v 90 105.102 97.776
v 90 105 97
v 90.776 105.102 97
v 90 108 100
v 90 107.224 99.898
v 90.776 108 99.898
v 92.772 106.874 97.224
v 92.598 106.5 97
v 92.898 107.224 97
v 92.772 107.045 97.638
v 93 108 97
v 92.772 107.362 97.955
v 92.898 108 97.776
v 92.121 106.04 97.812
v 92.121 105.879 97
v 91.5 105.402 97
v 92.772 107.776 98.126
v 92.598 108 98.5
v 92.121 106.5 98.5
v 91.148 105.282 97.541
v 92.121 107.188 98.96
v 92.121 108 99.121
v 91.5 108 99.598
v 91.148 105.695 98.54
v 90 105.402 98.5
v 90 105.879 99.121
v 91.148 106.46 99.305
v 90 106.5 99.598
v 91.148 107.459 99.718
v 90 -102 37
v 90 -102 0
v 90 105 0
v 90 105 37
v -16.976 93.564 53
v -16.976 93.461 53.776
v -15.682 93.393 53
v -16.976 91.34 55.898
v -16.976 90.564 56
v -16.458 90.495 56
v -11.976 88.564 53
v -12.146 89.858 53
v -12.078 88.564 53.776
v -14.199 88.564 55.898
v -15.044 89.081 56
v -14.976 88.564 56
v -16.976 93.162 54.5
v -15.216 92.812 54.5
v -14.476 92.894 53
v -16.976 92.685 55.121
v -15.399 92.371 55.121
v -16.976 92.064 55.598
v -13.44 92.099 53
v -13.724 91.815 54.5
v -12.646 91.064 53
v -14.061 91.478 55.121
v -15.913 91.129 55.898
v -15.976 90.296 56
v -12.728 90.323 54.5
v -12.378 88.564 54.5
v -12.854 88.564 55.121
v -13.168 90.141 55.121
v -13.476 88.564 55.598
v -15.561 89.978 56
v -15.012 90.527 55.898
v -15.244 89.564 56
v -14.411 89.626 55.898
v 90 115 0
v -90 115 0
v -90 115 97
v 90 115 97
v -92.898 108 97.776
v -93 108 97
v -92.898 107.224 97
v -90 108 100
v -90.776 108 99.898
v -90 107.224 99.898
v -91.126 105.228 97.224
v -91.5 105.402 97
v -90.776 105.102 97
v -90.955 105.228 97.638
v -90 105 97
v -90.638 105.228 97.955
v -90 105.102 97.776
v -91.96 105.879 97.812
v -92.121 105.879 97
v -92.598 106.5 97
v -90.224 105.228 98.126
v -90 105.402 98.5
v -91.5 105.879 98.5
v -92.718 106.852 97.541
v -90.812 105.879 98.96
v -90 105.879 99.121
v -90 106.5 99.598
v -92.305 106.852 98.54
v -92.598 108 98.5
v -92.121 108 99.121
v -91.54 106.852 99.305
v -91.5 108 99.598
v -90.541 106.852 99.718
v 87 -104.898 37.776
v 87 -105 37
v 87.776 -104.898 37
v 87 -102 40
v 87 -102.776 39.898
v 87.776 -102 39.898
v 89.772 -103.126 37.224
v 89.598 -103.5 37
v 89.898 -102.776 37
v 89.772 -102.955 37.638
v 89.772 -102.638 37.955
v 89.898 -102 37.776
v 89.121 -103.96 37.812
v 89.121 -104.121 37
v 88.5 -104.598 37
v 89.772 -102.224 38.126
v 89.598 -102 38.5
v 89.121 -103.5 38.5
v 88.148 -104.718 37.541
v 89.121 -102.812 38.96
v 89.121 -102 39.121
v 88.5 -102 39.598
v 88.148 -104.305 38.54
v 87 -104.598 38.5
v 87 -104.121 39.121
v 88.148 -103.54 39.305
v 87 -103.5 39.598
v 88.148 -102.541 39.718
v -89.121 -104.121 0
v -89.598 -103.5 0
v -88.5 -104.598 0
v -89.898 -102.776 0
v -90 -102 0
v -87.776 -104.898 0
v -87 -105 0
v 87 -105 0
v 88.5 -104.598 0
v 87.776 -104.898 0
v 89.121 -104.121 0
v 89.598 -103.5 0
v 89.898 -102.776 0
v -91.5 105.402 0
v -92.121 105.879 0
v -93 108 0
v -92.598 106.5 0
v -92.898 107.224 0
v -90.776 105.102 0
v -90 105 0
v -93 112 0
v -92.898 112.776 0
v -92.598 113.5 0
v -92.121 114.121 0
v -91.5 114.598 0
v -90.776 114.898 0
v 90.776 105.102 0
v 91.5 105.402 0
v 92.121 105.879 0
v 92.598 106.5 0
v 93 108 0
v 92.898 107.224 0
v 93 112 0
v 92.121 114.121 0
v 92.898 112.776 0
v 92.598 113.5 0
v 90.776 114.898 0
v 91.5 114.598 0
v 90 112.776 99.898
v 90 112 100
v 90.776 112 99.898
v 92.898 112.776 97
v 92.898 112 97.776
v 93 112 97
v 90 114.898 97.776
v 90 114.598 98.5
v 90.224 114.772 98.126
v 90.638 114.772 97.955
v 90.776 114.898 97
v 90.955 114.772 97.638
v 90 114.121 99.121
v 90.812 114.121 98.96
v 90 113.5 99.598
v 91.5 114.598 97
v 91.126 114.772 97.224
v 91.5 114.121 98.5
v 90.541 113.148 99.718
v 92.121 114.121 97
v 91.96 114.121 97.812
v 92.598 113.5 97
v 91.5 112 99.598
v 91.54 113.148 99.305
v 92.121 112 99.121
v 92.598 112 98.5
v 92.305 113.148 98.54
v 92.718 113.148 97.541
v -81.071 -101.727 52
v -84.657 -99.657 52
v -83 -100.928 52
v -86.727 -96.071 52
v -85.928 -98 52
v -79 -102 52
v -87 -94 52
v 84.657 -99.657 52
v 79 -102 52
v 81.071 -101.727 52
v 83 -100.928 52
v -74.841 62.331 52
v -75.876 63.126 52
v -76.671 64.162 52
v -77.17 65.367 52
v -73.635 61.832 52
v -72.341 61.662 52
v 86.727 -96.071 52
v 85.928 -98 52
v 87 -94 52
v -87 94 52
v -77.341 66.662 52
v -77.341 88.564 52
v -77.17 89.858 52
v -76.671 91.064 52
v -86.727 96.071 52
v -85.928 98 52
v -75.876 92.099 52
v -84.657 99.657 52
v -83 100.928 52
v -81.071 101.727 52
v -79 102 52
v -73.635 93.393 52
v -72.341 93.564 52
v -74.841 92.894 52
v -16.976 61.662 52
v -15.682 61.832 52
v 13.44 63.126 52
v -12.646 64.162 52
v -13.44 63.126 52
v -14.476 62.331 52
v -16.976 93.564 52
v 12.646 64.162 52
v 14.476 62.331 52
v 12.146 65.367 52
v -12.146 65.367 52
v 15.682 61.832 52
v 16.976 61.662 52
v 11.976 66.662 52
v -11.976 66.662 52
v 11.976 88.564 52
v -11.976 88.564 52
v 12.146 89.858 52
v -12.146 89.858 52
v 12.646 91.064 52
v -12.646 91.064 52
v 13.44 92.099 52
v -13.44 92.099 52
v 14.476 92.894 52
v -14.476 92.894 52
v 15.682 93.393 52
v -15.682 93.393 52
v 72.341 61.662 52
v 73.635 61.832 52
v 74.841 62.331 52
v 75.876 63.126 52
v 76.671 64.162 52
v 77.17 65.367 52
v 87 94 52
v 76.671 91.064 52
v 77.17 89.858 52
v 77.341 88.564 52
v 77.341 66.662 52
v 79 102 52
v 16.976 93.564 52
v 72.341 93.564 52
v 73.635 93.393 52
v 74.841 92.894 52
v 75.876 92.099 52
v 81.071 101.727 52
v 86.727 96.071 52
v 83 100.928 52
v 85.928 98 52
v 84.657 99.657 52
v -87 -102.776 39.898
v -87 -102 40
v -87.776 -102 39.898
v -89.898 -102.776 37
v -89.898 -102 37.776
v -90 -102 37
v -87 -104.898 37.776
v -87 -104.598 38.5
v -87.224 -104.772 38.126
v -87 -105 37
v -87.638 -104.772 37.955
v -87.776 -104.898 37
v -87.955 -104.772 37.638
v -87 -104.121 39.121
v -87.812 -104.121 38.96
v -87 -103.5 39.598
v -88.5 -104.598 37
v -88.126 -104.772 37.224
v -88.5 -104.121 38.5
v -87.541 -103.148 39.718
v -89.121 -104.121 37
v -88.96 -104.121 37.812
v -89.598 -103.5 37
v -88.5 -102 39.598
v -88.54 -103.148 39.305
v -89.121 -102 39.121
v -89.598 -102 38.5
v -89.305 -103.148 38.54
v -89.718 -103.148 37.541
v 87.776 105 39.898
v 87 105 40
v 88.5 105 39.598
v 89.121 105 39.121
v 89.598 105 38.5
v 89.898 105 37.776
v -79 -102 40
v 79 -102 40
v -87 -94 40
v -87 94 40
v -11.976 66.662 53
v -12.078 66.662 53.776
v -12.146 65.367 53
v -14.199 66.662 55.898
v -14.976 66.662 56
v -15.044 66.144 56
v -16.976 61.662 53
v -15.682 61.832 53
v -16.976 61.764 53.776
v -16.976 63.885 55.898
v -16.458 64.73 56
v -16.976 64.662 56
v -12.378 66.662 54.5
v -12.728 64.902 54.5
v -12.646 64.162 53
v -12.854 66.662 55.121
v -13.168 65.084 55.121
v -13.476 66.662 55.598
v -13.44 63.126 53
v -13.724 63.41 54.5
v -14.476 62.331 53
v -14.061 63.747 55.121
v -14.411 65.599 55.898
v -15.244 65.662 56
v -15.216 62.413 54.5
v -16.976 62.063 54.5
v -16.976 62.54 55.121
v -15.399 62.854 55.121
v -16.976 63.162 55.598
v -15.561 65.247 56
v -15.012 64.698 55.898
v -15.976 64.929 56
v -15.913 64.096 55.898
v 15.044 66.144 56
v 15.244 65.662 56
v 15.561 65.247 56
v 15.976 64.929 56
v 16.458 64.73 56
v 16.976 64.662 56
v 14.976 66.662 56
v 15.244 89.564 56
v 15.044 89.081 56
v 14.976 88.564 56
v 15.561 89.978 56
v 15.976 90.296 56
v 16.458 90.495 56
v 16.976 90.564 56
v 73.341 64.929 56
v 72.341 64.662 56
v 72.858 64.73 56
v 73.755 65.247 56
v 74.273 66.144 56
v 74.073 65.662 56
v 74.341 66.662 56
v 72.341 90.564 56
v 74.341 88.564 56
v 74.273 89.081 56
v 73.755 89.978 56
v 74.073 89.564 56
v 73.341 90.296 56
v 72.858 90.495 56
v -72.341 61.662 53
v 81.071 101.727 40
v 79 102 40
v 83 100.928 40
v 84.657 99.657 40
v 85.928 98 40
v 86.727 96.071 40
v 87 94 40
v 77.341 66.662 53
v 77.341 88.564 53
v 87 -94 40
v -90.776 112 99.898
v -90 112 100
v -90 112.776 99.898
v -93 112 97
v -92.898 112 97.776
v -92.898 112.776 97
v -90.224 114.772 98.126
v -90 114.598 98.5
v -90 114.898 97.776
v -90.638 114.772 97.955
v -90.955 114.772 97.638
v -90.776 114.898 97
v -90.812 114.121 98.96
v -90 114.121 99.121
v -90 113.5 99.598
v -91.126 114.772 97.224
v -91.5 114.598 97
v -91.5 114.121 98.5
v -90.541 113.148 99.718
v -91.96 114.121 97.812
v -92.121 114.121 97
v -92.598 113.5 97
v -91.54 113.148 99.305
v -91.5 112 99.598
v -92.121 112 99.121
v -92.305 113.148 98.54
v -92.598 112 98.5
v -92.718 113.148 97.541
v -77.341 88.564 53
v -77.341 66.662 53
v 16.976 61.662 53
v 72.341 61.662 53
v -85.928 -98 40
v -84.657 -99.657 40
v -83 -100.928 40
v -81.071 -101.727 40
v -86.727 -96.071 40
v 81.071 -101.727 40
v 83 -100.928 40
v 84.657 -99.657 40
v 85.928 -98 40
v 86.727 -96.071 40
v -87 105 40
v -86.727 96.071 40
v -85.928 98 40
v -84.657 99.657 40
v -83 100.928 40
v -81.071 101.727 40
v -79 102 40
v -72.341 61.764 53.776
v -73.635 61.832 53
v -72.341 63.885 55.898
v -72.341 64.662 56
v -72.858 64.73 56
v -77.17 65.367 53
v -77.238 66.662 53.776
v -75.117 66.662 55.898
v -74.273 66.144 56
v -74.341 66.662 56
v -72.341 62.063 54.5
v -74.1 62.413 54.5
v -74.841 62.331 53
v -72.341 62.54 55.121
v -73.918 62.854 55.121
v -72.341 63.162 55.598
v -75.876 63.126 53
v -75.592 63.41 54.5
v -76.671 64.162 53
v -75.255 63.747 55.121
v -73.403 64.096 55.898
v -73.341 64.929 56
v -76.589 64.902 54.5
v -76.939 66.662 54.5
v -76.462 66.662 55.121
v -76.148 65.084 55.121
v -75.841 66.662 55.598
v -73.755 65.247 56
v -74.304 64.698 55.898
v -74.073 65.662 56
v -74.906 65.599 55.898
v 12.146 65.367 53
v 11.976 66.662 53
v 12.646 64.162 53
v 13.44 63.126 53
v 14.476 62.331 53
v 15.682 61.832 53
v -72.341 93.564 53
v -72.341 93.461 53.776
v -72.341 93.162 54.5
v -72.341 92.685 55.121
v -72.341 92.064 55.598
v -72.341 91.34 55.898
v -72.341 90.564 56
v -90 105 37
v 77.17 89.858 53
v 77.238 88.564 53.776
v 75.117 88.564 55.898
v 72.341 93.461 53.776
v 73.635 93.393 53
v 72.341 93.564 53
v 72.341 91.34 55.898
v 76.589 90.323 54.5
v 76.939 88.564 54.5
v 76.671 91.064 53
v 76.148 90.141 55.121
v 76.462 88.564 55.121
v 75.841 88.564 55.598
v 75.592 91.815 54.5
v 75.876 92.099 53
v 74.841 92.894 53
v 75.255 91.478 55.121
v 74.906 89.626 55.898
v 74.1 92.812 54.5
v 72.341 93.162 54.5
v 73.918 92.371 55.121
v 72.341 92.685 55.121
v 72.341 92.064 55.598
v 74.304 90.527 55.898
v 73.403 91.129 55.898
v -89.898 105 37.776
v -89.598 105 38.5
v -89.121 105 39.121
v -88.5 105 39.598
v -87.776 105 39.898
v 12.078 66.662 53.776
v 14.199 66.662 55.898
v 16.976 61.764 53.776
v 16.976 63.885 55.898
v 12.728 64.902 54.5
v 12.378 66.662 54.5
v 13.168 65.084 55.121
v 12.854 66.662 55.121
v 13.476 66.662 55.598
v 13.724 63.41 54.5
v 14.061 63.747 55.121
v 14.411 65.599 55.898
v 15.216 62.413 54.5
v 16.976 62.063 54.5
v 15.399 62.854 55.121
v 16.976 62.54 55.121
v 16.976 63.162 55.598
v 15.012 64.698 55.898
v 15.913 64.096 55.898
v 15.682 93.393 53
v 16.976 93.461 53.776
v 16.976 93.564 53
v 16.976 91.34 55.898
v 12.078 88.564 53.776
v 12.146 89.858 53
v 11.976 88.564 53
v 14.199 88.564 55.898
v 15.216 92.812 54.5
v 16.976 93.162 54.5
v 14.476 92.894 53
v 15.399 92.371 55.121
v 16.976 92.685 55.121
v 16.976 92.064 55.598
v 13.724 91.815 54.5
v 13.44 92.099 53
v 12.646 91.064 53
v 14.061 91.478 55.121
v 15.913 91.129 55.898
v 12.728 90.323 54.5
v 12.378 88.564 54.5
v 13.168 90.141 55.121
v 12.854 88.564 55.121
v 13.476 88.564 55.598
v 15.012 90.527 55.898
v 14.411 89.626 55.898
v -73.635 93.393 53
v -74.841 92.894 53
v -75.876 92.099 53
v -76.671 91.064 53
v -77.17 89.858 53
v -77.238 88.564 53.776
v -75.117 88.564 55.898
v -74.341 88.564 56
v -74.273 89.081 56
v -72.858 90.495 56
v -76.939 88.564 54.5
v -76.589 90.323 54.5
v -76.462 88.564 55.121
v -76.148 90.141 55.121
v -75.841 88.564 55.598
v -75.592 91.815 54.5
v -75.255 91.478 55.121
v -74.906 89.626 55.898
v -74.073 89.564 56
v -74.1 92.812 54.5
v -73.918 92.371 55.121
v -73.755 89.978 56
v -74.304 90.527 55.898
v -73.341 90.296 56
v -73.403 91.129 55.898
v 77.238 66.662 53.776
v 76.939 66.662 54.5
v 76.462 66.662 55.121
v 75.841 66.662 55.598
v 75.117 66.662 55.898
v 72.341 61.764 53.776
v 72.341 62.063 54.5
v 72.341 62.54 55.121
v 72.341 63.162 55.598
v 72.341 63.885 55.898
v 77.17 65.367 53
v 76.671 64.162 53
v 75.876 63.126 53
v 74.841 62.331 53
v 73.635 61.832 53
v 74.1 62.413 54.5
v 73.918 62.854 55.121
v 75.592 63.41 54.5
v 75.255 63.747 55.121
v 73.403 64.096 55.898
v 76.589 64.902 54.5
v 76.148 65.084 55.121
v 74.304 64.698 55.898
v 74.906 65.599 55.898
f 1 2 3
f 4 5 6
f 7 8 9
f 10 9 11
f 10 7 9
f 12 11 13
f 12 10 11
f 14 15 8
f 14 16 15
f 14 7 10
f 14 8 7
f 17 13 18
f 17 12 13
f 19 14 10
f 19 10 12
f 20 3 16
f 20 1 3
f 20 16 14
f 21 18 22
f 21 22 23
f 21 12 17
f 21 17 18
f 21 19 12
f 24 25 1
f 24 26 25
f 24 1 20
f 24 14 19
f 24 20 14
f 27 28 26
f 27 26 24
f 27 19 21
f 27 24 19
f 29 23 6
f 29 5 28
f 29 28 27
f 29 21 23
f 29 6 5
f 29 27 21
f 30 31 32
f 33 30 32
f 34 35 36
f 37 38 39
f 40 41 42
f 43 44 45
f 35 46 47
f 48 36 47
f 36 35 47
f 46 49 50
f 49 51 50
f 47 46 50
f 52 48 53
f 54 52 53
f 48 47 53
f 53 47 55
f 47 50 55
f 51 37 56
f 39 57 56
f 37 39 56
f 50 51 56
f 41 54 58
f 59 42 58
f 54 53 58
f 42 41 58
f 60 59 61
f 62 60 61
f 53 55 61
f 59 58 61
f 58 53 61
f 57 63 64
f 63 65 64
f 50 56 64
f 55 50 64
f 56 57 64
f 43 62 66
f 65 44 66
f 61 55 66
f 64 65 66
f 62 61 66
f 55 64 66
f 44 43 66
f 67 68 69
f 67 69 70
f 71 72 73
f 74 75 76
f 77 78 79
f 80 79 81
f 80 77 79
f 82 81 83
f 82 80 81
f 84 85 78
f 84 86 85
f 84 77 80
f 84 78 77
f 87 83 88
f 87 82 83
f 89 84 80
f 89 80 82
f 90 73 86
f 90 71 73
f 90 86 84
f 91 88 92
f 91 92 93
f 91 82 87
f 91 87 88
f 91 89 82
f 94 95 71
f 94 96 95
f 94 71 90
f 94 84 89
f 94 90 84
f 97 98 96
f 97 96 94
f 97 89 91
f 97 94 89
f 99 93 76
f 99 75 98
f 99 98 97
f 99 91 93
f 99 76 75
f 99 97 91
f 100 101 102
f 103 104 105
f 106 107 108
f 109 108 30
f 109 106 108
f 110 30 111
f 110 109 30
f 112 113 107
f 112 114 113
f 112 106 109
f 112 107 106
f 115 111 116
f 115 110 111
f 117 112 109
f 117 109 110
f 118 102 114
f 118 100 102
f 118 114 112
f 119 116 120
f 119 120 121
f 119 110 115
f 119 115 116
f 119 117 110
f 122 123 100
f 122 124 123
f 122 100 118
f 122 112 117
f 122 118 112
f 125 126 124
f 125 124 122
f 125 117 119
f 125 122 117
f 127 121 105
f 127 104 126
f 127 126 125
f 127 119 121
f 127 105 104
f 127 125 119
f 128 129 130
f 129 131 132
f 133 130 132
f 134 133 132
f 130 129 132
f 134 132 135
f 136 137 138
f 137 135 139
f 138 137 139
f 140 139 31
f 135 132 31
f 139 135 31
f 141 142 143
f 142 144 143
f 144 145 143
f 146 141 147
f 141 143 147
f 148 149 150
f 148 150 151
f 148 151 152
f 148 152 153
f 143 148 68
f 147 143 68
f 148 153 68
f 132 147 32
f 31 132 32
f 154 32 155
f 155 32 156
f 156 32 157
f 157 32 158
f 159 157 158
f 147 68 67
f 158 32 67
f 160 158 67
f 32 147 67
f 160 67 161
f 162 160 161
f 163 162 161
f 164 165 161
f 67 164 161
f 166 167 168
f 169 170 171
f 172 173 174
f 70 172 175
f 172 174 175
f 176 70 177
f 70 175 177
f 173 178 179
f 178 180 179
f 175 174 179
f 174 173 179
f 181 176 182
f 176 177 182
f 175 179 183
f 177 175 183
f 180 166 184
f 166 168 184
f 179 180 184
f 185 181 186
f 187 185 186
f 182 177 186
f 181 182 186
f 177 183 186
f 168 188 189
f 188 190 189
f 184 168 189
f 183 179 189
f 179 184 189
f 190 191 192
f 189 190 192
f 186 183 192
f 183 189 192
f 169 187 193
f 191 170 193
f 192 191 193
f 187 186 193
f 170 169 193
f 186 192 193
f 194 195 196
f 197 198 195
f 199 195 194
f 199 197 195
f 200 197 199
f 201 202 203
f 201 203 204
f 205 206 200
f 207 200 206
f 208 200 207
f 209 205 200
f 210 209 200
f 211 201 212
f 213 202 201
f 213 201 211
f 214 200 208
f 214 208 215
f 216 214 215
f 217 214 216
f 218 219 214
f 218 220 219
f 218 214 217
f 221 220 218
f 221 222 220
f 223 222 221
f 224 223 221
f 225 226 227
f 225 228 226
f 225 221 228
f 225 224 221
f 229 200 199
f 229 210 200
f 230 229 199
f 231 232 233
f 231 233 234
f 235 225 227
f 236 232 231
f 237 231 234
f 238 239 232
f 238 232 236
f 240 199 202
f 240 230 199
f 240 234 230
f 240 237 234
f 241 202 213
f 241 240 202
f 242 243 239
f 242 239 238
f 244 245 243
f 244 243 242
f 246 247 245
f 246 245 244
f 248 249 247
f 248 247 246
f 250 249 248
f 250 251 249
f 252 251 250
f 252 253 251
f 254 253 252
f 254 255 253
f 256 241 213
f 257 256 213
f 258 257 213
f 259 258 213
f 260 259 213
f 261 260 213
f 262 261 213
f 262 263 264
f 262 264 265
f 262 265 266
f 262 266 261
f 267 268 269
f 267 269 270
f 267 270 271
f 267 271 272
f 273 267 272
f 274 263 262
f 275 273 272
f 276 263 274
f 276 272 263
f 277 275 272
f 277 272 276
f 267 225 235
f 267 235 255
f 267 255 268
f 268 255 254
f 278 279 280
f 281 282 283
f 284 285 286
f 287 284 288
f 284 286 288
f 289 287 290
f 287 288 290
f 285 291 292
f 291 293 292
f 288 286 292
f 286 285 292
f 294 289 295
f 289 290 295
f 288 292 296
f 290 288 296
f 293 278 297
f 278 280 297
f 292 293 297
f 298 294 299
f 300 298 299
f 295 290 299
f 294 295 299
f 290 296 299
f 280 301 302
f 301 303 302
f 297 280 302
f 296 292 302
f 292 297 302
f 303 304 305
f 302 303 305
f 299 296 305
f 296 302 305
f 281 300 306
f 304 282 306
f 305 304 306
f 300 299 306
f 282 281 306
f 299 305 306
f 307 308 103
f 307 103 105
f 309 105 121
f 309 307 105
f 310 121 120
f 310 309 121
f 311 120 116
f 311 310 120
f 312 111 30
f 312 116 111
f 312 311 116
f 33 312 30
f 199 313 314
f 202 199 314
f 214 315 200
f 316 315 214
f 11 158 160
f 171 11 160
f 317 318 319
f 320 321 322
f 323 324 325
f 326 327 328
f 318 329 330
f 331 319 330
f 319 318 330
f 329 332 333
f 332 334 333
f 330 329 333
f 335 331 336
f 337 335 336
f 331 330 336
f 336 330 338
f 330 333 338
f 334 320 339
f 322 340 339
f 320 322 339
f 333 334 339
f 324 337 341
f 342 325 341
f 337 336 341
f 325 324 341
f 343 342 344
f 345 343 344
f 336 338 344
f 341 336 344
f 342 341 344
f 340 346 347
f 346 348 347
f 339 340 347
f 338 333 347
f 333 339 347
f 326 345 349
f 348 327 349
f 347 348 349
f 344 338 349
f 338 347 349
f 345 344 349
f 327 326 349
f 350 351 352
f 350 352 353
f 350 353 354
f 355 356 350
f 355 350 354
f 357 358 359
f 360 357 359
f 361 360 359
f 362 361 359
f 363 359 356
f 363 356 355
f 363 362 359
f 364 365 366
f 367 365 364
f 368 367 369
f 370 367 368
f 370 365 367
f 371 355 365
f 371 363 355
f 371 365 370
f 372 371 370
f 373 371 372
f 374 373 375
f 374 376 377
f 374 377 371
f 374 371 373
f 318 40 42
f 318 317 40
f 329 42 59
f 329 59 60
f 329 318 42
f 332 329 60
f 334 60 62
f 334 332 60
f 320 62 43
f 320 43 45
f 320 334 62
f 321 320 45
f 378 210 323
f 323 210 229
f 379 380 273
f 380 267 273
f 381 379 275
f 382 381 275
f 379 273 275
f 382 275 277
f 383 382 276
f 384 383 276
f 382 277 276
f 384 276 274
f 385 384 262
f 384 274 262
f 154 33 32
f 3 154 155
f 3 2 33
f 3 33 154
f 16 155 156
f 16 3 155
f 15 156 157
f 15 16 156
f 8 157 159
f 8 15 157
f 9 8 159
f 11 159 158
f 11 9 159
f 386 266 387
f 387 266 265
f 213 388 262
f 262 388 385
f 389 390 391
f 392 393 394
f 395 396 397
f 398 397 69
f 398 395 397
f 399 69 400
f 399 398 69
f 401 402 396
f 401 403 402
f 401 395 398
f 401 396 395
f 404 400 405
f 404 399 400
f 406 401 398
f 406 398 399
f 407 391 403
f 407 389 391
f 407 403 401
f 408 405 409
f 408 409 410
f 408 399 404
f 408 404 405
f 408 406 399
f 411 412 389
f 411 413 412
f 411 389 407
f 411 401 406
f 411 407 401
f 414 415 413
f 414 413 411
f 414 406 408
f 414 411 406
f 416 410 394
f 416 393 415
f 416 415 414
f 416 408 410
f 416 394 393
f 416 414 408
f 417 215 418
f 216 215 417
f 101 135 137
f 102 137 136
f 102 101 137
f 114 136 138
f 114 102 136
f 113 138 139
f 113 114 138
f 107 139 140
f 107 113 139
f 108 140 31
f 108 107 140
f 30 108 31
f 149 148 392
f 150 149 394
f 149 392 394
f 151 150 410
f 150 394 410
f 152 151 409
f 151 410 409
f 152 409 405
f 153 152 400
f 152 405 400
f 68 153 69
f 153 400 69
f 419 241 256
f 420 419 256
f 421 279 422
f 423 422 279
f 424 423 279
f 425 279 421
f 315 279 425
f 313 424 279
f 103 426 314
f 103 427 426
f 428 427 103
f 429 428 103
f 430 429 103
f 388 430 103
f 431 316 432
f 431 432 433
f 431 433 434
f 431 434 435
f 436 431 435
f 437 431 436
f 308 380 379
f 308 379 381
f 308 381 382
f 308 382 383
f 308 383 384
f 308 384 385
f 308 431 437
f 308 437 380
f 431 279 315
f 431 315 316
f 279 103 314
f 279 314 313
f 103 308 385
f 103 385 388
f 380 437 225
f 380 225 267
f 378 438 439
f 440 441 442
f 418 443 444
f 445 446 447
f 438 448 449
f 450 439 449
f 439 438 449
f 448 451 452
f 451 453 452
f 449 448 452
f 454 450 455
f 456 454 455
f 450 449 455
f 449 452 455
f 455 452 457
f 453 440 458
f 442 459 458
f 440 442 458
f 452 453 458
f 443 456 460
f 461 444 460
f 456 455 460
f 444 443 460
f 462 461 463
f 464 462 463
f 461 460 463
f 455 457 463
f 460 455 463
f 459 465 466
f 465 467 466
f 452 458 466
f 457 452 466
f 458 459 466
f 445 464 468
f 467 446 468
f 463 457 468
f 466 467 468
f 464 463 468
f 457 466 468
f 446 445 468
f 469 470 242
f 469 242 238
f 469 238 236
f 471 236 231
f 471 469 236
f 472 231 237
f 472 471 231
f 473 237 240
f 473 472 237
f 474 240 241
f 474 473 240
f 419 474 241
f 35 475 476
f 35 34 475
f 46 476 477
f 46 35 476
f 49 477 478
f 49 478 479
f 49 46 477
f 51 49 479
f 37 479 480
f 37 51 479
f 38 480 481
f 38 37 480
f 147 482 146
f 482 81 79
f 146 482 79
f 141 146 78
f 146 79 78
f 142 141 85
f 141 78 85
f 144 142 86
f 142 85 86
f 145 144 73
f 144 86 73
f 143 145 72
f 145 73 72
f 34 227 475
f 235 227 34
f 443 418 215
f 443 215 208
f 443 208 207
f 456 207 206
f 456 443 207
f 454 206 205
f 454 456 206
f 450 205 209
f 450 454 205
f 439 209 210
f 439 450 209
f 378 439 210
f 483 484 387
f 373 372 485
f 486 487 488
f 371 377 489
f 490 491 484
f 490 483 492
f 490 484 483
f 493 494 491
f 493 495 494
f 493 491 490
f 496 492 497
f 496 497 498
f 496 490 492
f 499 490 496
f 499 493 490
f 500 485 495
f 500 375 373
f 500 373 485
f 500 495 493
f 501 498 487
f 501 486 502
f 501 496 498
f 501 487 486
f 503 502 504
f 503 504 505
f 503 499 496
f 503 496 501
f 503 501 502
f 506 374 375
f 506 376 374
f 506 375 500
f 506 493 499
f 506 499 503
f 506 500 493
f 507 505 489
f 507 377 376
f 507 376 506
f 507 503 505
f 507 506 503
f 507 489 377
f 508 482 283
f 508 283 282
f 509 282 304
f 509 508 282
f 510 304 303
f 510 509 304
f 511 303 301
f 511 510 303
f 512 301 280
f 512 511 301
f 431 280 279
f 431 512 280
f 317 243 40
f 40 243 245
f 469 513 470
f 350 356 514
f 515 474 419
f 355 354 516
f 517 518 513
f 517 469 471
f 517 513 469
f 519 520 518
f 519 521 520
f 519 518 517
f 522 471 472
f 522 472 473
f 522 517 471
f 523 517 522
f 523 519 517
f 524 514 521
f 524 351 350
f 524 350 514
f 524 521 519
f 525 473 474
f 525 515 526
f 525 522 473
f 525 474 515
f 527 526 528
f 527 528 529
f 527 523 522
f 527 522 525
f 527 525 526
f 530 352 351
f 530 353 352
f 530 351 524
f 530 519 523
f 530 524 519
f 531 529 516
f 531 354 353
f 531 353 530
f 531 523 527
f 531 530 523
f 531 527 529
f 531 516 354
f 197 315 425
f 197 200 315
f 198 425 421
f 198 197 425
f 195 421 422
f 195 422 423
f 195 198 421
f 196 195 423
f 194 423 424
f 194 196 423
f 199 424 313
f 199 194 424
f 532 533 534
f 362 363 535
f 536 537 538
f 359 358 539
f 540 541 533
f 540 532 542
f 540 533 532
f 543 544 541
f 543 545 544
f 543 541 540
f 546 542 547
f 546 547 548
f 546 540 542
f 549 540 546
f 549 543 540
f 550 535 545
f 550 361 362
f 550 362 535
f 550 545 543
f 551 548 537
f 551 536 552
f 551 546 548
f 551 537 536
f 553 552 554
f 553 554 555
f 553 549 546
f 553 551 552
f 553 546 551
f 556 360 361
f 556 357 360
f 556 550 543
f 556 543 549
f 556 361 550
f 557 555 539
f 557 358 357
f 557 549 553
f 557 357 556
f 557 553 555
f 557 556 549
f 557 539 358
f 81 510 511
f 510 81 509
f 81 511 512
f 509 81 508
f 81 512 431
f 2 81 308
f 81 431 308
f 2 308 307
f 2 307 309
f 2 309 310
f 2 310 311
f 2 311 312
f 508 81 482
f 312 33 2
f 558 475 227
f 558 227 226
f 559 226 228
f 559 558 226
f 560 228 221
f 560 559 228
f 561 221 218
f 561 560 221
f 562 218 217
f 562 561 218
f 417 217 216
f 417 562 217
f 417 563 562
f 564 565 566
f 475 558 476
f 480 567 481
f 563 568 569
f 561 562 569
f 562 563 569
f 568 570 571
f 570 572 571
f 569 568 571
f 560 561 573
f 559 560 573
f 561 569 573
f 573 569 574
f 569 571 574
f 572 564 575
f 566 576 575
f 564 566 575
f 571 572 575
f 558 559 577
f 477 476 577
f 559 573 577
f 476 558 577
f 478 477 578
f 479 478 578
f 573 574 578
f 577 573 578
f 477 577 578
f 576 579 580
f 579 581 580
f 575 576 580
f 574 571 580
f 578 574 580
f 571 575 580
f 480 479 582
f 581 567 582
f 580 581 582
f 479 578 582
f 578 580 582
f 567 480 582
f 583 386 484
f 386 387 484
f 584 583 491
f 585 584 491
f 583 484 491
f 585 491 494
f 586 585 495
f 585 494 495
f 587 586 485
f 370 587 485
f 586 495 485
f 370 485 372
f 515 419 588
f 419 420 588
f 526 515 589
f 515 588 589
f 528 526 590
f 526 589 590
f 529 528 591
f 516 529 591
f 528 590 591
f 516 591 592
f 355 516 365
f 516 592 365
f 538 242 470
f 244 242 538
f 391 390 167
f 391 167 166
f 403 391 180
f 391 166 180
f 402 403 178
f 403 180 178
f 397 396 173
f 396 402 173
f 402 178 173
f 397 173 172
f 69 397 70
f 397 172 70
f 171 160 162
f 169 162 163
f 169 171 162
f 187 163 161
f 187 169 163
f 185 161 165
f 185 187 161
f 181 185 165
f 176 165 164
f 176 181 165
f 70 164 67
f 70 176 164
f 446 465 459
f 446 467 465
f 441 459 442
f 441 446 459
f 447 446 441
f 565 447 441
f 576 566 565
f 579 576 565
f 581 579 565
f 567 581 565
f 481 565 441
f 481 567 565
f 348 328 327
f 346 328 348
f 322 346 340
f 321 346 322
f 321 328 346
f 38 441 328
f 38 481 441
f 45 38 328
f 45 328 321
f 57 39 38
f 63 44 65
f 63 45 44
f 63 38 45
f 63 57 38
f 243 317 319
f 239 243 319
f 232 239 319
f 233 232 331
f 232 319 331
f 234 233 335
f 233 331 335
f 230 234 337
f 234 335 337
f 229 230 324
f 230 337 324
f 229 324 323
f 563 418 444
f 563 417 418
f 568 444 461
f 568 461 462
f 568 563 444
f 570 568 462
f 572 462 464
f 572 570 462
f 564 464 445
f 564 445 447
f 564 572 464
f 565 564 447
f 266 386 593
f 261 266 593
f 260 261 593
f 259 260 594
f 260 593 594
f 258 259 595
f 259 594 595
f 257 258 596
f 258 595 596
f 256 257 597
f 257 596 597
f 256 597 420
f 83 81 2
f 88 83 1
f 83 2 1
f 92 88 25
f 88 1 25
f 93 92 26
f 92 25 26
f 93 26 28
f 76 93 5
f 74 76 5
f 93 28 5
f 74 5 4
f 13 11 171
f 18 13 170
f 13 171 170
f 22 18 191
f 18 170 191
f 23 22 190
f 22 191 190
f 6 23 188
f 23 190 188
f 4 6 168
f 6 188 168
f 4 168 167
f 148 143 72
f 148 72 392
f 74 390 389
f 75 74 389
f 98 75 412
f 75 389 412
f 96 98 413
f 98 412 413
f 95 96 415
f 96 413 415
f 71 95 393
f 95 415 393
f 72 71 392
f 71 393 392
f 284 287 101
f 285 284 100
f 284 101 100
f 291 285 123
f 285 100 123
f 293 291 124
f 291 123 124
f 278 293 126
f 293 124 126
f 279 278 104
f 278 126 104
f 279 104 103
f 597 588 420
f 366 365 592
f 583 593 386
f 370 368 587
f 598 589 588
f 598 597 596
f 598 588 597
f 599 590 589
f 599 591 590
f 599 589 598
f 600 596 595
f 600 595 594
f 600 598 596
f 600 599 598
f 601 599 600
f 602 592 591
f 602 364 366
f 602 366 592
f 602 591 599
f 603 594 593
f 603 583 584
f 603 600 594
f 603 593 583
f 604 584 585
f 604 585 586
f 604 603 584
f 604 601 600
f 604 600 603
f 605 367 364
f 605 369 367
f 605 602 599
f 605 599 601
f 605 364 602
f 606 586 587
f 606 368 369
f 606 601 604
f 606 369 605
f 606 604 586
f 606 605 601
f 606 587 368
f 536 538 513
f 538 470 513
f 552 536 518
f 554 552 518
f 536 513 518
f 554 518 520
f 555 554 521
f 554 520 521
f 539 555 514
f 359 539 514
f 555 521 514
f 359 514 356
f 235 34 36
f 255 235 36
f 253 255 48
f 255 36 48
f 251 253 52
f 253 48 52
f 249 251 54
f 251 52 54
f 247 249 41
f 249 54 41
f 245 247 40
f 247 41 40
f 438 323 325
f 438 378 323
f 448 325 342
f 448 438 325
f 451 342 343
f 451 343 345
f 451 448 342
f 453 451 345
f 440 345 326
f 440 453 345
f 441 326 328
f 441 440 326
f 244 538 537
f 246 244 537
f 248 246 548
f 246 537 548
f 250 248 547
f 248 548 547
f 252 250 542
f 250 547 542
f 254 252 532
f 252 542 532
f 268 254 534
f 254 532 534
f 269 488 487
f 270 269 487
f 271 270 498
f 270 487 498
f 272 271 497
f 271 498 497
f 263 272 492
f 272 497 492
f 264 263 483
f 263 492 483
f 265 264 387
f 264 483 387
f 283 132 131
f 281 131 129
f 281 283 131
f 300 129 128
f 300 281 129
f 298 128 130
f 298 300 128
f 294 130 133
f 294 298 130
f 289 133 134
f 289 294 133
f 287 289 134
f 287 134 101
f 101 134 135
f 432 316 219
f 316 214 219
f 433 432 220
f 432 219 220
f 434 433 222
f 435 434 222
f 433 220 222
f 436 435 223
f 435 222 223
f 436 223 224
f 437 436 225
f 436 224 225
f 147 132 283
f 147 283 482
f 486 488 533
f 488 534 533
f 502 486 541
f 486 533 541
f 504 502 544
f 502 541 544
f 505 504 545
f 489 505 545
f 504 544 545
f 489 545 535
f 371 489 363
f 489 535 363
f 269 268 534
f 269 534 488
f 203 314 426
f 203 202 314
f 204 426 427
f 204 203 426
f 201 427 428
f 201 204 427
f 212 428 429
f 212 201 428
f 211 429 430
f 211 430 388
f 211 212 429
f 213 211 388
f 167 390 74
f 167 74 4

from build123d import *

# Parameters (mm, degrees)
F0_W     = 180
F0_H     = 210
F1_DEPTH = 40
F2_W     = 186
F2_H     = 10
F3_DEPTH = 100
F4_W     = 174
F4_H     = 204
F5_DEPTH = 12
F6_W     = 65.3649838641
F6_H     = 31.9020412862
F7_DEPTH = 4
F8_DEPTH = 4
F9_R     = 8
F10_R    = 3
F11_R    = 2.99999
F12_R    = 5
F13_R    = 3


# Not quite as in the source:
# - a fillet or chamfer is up to 0.001 mm smaller than in the source, because OpenCascade refuses the exact size


with BuildPart() as f1:
    # F0 (on Top) → F1 (new body)
    with BuildSketch(Plane.XY):
        Rectangle(F0_W, F0_H)
    extrude(amount=F1_DEPTH)

    # F2 (on Top) → F3 (join)
    with BuildSketch(Plane.XY):
        with Locations((0, 110)):
            Rectangle(F2_W, F2_H)
    extrude(amount=F3_DEPTH)

    # F4 (on face) → F5 (join)
    with BuildSketch(Plane.XY.offset(40)):
        Rectangle(F4_W, F4_H)
    extrude(amount=F5_DEPTH)

    # F6 (on face) → F7 (join)
    with BuildSketch(Plane.XY.offset(52)):
        with Locations((-44.6581854485, 77.6125434786)):
            Rectangle(F6_W, F6_H)
    extrude(amount=F7_DEPTH)

    # F6 (on face) → F8 (join)
    with BuildSketch(Plane.XY.offset(52)):
        with Locations((-44.6581854485, 77.6125434786)):
            Rectangle(F6_W, F6_H)
        with Locations((44.6581854485, 77.6125434786)):
            Rectangle(F6_W, F6_H)
    extrude(amount=F8_DEPTH)

    # F9
    f9_edges = [f1.edges().sort_by_distance(p)[0] for p in [
        (-87, -102, 46),
        (87, -102, 46),
        (87, 102, 46),
        (-87, 102, 46),
    ]]
    fillet(f9_edges, radius=F9_R)

    # F10
    f10_edges = [f1.edges().sort_by_distance(p)[0] for p in [
        (-93, 110, 100),
        (-93, 105, 50),
        (0, 105, 100),
        (93, 105, 50),
        (93, 110, 100),
        (0, 115, 100),
        (-93, 115, 50),
        (93, 115, 50),
    ]]
    fillet(f10_edges, radius=F10_R)

    # F11 (radius 3 in the source; OpenCascade refuses exactly that, so slightly less here)
    f11_edges = [f1.edges().sort_by_distance(p)[0] for p in [
        (-90, 0, 40),
        (0, -105, 40),
        (-90, -105, 20),
        (90, -105, 20),
        (90, 0, 40),
    ]]
    fillet(f11_edges, radius=F11_R)

    # F12
    f12_edges = [f1.edges().sort_by_distance(p)[0] for p in [
        (-77.340677, 61.661523, 54),
        (-11.975694, 61.661523, 54),
        (-11.975694, 93.563564, 54),
        (-77.340677, 93.563564, 54),
        (11.975694, 93.563564, 54),
        (11.975694, 61.661523, 54),
        (77.340677, 61.661523, 54),
        (77.340677, 93.563564, 54),
    ]]
    fillet(f12_edges, radius=F12_R)

    # F13
    f13_edges = [f1.edges().sort_by_distance(p)[0] for p in [
        (77.340677, 77.612543, 56),
        (75.876211, 63.125989, 56),
        (75.876211, 92.099098, 56),
        (44.658185, 61.661523, 56),
        (44.658185, 93.563564, 56),
        (13.44016, 63.125989, 56),
        (13.44016, 92.099098, 56),
        (11.975694, 77.612543, 56),
        (-44.658185, 93.563564, 56),
        (-13.44016, 92.099098, 56),
        (-75.876211, 92.099098, 56),
        (-11.975694, 77.612543, 56),
        (-77.340677, 77.612543, 56),
        (-13.44016, 63.125989, 56),
        (-75.876211, 63.125989, 56),
        (-44.658185, 61.661523, 56),
    ]]
    fillet(f13_edges, radius=F13_R)


solid = f1.part
